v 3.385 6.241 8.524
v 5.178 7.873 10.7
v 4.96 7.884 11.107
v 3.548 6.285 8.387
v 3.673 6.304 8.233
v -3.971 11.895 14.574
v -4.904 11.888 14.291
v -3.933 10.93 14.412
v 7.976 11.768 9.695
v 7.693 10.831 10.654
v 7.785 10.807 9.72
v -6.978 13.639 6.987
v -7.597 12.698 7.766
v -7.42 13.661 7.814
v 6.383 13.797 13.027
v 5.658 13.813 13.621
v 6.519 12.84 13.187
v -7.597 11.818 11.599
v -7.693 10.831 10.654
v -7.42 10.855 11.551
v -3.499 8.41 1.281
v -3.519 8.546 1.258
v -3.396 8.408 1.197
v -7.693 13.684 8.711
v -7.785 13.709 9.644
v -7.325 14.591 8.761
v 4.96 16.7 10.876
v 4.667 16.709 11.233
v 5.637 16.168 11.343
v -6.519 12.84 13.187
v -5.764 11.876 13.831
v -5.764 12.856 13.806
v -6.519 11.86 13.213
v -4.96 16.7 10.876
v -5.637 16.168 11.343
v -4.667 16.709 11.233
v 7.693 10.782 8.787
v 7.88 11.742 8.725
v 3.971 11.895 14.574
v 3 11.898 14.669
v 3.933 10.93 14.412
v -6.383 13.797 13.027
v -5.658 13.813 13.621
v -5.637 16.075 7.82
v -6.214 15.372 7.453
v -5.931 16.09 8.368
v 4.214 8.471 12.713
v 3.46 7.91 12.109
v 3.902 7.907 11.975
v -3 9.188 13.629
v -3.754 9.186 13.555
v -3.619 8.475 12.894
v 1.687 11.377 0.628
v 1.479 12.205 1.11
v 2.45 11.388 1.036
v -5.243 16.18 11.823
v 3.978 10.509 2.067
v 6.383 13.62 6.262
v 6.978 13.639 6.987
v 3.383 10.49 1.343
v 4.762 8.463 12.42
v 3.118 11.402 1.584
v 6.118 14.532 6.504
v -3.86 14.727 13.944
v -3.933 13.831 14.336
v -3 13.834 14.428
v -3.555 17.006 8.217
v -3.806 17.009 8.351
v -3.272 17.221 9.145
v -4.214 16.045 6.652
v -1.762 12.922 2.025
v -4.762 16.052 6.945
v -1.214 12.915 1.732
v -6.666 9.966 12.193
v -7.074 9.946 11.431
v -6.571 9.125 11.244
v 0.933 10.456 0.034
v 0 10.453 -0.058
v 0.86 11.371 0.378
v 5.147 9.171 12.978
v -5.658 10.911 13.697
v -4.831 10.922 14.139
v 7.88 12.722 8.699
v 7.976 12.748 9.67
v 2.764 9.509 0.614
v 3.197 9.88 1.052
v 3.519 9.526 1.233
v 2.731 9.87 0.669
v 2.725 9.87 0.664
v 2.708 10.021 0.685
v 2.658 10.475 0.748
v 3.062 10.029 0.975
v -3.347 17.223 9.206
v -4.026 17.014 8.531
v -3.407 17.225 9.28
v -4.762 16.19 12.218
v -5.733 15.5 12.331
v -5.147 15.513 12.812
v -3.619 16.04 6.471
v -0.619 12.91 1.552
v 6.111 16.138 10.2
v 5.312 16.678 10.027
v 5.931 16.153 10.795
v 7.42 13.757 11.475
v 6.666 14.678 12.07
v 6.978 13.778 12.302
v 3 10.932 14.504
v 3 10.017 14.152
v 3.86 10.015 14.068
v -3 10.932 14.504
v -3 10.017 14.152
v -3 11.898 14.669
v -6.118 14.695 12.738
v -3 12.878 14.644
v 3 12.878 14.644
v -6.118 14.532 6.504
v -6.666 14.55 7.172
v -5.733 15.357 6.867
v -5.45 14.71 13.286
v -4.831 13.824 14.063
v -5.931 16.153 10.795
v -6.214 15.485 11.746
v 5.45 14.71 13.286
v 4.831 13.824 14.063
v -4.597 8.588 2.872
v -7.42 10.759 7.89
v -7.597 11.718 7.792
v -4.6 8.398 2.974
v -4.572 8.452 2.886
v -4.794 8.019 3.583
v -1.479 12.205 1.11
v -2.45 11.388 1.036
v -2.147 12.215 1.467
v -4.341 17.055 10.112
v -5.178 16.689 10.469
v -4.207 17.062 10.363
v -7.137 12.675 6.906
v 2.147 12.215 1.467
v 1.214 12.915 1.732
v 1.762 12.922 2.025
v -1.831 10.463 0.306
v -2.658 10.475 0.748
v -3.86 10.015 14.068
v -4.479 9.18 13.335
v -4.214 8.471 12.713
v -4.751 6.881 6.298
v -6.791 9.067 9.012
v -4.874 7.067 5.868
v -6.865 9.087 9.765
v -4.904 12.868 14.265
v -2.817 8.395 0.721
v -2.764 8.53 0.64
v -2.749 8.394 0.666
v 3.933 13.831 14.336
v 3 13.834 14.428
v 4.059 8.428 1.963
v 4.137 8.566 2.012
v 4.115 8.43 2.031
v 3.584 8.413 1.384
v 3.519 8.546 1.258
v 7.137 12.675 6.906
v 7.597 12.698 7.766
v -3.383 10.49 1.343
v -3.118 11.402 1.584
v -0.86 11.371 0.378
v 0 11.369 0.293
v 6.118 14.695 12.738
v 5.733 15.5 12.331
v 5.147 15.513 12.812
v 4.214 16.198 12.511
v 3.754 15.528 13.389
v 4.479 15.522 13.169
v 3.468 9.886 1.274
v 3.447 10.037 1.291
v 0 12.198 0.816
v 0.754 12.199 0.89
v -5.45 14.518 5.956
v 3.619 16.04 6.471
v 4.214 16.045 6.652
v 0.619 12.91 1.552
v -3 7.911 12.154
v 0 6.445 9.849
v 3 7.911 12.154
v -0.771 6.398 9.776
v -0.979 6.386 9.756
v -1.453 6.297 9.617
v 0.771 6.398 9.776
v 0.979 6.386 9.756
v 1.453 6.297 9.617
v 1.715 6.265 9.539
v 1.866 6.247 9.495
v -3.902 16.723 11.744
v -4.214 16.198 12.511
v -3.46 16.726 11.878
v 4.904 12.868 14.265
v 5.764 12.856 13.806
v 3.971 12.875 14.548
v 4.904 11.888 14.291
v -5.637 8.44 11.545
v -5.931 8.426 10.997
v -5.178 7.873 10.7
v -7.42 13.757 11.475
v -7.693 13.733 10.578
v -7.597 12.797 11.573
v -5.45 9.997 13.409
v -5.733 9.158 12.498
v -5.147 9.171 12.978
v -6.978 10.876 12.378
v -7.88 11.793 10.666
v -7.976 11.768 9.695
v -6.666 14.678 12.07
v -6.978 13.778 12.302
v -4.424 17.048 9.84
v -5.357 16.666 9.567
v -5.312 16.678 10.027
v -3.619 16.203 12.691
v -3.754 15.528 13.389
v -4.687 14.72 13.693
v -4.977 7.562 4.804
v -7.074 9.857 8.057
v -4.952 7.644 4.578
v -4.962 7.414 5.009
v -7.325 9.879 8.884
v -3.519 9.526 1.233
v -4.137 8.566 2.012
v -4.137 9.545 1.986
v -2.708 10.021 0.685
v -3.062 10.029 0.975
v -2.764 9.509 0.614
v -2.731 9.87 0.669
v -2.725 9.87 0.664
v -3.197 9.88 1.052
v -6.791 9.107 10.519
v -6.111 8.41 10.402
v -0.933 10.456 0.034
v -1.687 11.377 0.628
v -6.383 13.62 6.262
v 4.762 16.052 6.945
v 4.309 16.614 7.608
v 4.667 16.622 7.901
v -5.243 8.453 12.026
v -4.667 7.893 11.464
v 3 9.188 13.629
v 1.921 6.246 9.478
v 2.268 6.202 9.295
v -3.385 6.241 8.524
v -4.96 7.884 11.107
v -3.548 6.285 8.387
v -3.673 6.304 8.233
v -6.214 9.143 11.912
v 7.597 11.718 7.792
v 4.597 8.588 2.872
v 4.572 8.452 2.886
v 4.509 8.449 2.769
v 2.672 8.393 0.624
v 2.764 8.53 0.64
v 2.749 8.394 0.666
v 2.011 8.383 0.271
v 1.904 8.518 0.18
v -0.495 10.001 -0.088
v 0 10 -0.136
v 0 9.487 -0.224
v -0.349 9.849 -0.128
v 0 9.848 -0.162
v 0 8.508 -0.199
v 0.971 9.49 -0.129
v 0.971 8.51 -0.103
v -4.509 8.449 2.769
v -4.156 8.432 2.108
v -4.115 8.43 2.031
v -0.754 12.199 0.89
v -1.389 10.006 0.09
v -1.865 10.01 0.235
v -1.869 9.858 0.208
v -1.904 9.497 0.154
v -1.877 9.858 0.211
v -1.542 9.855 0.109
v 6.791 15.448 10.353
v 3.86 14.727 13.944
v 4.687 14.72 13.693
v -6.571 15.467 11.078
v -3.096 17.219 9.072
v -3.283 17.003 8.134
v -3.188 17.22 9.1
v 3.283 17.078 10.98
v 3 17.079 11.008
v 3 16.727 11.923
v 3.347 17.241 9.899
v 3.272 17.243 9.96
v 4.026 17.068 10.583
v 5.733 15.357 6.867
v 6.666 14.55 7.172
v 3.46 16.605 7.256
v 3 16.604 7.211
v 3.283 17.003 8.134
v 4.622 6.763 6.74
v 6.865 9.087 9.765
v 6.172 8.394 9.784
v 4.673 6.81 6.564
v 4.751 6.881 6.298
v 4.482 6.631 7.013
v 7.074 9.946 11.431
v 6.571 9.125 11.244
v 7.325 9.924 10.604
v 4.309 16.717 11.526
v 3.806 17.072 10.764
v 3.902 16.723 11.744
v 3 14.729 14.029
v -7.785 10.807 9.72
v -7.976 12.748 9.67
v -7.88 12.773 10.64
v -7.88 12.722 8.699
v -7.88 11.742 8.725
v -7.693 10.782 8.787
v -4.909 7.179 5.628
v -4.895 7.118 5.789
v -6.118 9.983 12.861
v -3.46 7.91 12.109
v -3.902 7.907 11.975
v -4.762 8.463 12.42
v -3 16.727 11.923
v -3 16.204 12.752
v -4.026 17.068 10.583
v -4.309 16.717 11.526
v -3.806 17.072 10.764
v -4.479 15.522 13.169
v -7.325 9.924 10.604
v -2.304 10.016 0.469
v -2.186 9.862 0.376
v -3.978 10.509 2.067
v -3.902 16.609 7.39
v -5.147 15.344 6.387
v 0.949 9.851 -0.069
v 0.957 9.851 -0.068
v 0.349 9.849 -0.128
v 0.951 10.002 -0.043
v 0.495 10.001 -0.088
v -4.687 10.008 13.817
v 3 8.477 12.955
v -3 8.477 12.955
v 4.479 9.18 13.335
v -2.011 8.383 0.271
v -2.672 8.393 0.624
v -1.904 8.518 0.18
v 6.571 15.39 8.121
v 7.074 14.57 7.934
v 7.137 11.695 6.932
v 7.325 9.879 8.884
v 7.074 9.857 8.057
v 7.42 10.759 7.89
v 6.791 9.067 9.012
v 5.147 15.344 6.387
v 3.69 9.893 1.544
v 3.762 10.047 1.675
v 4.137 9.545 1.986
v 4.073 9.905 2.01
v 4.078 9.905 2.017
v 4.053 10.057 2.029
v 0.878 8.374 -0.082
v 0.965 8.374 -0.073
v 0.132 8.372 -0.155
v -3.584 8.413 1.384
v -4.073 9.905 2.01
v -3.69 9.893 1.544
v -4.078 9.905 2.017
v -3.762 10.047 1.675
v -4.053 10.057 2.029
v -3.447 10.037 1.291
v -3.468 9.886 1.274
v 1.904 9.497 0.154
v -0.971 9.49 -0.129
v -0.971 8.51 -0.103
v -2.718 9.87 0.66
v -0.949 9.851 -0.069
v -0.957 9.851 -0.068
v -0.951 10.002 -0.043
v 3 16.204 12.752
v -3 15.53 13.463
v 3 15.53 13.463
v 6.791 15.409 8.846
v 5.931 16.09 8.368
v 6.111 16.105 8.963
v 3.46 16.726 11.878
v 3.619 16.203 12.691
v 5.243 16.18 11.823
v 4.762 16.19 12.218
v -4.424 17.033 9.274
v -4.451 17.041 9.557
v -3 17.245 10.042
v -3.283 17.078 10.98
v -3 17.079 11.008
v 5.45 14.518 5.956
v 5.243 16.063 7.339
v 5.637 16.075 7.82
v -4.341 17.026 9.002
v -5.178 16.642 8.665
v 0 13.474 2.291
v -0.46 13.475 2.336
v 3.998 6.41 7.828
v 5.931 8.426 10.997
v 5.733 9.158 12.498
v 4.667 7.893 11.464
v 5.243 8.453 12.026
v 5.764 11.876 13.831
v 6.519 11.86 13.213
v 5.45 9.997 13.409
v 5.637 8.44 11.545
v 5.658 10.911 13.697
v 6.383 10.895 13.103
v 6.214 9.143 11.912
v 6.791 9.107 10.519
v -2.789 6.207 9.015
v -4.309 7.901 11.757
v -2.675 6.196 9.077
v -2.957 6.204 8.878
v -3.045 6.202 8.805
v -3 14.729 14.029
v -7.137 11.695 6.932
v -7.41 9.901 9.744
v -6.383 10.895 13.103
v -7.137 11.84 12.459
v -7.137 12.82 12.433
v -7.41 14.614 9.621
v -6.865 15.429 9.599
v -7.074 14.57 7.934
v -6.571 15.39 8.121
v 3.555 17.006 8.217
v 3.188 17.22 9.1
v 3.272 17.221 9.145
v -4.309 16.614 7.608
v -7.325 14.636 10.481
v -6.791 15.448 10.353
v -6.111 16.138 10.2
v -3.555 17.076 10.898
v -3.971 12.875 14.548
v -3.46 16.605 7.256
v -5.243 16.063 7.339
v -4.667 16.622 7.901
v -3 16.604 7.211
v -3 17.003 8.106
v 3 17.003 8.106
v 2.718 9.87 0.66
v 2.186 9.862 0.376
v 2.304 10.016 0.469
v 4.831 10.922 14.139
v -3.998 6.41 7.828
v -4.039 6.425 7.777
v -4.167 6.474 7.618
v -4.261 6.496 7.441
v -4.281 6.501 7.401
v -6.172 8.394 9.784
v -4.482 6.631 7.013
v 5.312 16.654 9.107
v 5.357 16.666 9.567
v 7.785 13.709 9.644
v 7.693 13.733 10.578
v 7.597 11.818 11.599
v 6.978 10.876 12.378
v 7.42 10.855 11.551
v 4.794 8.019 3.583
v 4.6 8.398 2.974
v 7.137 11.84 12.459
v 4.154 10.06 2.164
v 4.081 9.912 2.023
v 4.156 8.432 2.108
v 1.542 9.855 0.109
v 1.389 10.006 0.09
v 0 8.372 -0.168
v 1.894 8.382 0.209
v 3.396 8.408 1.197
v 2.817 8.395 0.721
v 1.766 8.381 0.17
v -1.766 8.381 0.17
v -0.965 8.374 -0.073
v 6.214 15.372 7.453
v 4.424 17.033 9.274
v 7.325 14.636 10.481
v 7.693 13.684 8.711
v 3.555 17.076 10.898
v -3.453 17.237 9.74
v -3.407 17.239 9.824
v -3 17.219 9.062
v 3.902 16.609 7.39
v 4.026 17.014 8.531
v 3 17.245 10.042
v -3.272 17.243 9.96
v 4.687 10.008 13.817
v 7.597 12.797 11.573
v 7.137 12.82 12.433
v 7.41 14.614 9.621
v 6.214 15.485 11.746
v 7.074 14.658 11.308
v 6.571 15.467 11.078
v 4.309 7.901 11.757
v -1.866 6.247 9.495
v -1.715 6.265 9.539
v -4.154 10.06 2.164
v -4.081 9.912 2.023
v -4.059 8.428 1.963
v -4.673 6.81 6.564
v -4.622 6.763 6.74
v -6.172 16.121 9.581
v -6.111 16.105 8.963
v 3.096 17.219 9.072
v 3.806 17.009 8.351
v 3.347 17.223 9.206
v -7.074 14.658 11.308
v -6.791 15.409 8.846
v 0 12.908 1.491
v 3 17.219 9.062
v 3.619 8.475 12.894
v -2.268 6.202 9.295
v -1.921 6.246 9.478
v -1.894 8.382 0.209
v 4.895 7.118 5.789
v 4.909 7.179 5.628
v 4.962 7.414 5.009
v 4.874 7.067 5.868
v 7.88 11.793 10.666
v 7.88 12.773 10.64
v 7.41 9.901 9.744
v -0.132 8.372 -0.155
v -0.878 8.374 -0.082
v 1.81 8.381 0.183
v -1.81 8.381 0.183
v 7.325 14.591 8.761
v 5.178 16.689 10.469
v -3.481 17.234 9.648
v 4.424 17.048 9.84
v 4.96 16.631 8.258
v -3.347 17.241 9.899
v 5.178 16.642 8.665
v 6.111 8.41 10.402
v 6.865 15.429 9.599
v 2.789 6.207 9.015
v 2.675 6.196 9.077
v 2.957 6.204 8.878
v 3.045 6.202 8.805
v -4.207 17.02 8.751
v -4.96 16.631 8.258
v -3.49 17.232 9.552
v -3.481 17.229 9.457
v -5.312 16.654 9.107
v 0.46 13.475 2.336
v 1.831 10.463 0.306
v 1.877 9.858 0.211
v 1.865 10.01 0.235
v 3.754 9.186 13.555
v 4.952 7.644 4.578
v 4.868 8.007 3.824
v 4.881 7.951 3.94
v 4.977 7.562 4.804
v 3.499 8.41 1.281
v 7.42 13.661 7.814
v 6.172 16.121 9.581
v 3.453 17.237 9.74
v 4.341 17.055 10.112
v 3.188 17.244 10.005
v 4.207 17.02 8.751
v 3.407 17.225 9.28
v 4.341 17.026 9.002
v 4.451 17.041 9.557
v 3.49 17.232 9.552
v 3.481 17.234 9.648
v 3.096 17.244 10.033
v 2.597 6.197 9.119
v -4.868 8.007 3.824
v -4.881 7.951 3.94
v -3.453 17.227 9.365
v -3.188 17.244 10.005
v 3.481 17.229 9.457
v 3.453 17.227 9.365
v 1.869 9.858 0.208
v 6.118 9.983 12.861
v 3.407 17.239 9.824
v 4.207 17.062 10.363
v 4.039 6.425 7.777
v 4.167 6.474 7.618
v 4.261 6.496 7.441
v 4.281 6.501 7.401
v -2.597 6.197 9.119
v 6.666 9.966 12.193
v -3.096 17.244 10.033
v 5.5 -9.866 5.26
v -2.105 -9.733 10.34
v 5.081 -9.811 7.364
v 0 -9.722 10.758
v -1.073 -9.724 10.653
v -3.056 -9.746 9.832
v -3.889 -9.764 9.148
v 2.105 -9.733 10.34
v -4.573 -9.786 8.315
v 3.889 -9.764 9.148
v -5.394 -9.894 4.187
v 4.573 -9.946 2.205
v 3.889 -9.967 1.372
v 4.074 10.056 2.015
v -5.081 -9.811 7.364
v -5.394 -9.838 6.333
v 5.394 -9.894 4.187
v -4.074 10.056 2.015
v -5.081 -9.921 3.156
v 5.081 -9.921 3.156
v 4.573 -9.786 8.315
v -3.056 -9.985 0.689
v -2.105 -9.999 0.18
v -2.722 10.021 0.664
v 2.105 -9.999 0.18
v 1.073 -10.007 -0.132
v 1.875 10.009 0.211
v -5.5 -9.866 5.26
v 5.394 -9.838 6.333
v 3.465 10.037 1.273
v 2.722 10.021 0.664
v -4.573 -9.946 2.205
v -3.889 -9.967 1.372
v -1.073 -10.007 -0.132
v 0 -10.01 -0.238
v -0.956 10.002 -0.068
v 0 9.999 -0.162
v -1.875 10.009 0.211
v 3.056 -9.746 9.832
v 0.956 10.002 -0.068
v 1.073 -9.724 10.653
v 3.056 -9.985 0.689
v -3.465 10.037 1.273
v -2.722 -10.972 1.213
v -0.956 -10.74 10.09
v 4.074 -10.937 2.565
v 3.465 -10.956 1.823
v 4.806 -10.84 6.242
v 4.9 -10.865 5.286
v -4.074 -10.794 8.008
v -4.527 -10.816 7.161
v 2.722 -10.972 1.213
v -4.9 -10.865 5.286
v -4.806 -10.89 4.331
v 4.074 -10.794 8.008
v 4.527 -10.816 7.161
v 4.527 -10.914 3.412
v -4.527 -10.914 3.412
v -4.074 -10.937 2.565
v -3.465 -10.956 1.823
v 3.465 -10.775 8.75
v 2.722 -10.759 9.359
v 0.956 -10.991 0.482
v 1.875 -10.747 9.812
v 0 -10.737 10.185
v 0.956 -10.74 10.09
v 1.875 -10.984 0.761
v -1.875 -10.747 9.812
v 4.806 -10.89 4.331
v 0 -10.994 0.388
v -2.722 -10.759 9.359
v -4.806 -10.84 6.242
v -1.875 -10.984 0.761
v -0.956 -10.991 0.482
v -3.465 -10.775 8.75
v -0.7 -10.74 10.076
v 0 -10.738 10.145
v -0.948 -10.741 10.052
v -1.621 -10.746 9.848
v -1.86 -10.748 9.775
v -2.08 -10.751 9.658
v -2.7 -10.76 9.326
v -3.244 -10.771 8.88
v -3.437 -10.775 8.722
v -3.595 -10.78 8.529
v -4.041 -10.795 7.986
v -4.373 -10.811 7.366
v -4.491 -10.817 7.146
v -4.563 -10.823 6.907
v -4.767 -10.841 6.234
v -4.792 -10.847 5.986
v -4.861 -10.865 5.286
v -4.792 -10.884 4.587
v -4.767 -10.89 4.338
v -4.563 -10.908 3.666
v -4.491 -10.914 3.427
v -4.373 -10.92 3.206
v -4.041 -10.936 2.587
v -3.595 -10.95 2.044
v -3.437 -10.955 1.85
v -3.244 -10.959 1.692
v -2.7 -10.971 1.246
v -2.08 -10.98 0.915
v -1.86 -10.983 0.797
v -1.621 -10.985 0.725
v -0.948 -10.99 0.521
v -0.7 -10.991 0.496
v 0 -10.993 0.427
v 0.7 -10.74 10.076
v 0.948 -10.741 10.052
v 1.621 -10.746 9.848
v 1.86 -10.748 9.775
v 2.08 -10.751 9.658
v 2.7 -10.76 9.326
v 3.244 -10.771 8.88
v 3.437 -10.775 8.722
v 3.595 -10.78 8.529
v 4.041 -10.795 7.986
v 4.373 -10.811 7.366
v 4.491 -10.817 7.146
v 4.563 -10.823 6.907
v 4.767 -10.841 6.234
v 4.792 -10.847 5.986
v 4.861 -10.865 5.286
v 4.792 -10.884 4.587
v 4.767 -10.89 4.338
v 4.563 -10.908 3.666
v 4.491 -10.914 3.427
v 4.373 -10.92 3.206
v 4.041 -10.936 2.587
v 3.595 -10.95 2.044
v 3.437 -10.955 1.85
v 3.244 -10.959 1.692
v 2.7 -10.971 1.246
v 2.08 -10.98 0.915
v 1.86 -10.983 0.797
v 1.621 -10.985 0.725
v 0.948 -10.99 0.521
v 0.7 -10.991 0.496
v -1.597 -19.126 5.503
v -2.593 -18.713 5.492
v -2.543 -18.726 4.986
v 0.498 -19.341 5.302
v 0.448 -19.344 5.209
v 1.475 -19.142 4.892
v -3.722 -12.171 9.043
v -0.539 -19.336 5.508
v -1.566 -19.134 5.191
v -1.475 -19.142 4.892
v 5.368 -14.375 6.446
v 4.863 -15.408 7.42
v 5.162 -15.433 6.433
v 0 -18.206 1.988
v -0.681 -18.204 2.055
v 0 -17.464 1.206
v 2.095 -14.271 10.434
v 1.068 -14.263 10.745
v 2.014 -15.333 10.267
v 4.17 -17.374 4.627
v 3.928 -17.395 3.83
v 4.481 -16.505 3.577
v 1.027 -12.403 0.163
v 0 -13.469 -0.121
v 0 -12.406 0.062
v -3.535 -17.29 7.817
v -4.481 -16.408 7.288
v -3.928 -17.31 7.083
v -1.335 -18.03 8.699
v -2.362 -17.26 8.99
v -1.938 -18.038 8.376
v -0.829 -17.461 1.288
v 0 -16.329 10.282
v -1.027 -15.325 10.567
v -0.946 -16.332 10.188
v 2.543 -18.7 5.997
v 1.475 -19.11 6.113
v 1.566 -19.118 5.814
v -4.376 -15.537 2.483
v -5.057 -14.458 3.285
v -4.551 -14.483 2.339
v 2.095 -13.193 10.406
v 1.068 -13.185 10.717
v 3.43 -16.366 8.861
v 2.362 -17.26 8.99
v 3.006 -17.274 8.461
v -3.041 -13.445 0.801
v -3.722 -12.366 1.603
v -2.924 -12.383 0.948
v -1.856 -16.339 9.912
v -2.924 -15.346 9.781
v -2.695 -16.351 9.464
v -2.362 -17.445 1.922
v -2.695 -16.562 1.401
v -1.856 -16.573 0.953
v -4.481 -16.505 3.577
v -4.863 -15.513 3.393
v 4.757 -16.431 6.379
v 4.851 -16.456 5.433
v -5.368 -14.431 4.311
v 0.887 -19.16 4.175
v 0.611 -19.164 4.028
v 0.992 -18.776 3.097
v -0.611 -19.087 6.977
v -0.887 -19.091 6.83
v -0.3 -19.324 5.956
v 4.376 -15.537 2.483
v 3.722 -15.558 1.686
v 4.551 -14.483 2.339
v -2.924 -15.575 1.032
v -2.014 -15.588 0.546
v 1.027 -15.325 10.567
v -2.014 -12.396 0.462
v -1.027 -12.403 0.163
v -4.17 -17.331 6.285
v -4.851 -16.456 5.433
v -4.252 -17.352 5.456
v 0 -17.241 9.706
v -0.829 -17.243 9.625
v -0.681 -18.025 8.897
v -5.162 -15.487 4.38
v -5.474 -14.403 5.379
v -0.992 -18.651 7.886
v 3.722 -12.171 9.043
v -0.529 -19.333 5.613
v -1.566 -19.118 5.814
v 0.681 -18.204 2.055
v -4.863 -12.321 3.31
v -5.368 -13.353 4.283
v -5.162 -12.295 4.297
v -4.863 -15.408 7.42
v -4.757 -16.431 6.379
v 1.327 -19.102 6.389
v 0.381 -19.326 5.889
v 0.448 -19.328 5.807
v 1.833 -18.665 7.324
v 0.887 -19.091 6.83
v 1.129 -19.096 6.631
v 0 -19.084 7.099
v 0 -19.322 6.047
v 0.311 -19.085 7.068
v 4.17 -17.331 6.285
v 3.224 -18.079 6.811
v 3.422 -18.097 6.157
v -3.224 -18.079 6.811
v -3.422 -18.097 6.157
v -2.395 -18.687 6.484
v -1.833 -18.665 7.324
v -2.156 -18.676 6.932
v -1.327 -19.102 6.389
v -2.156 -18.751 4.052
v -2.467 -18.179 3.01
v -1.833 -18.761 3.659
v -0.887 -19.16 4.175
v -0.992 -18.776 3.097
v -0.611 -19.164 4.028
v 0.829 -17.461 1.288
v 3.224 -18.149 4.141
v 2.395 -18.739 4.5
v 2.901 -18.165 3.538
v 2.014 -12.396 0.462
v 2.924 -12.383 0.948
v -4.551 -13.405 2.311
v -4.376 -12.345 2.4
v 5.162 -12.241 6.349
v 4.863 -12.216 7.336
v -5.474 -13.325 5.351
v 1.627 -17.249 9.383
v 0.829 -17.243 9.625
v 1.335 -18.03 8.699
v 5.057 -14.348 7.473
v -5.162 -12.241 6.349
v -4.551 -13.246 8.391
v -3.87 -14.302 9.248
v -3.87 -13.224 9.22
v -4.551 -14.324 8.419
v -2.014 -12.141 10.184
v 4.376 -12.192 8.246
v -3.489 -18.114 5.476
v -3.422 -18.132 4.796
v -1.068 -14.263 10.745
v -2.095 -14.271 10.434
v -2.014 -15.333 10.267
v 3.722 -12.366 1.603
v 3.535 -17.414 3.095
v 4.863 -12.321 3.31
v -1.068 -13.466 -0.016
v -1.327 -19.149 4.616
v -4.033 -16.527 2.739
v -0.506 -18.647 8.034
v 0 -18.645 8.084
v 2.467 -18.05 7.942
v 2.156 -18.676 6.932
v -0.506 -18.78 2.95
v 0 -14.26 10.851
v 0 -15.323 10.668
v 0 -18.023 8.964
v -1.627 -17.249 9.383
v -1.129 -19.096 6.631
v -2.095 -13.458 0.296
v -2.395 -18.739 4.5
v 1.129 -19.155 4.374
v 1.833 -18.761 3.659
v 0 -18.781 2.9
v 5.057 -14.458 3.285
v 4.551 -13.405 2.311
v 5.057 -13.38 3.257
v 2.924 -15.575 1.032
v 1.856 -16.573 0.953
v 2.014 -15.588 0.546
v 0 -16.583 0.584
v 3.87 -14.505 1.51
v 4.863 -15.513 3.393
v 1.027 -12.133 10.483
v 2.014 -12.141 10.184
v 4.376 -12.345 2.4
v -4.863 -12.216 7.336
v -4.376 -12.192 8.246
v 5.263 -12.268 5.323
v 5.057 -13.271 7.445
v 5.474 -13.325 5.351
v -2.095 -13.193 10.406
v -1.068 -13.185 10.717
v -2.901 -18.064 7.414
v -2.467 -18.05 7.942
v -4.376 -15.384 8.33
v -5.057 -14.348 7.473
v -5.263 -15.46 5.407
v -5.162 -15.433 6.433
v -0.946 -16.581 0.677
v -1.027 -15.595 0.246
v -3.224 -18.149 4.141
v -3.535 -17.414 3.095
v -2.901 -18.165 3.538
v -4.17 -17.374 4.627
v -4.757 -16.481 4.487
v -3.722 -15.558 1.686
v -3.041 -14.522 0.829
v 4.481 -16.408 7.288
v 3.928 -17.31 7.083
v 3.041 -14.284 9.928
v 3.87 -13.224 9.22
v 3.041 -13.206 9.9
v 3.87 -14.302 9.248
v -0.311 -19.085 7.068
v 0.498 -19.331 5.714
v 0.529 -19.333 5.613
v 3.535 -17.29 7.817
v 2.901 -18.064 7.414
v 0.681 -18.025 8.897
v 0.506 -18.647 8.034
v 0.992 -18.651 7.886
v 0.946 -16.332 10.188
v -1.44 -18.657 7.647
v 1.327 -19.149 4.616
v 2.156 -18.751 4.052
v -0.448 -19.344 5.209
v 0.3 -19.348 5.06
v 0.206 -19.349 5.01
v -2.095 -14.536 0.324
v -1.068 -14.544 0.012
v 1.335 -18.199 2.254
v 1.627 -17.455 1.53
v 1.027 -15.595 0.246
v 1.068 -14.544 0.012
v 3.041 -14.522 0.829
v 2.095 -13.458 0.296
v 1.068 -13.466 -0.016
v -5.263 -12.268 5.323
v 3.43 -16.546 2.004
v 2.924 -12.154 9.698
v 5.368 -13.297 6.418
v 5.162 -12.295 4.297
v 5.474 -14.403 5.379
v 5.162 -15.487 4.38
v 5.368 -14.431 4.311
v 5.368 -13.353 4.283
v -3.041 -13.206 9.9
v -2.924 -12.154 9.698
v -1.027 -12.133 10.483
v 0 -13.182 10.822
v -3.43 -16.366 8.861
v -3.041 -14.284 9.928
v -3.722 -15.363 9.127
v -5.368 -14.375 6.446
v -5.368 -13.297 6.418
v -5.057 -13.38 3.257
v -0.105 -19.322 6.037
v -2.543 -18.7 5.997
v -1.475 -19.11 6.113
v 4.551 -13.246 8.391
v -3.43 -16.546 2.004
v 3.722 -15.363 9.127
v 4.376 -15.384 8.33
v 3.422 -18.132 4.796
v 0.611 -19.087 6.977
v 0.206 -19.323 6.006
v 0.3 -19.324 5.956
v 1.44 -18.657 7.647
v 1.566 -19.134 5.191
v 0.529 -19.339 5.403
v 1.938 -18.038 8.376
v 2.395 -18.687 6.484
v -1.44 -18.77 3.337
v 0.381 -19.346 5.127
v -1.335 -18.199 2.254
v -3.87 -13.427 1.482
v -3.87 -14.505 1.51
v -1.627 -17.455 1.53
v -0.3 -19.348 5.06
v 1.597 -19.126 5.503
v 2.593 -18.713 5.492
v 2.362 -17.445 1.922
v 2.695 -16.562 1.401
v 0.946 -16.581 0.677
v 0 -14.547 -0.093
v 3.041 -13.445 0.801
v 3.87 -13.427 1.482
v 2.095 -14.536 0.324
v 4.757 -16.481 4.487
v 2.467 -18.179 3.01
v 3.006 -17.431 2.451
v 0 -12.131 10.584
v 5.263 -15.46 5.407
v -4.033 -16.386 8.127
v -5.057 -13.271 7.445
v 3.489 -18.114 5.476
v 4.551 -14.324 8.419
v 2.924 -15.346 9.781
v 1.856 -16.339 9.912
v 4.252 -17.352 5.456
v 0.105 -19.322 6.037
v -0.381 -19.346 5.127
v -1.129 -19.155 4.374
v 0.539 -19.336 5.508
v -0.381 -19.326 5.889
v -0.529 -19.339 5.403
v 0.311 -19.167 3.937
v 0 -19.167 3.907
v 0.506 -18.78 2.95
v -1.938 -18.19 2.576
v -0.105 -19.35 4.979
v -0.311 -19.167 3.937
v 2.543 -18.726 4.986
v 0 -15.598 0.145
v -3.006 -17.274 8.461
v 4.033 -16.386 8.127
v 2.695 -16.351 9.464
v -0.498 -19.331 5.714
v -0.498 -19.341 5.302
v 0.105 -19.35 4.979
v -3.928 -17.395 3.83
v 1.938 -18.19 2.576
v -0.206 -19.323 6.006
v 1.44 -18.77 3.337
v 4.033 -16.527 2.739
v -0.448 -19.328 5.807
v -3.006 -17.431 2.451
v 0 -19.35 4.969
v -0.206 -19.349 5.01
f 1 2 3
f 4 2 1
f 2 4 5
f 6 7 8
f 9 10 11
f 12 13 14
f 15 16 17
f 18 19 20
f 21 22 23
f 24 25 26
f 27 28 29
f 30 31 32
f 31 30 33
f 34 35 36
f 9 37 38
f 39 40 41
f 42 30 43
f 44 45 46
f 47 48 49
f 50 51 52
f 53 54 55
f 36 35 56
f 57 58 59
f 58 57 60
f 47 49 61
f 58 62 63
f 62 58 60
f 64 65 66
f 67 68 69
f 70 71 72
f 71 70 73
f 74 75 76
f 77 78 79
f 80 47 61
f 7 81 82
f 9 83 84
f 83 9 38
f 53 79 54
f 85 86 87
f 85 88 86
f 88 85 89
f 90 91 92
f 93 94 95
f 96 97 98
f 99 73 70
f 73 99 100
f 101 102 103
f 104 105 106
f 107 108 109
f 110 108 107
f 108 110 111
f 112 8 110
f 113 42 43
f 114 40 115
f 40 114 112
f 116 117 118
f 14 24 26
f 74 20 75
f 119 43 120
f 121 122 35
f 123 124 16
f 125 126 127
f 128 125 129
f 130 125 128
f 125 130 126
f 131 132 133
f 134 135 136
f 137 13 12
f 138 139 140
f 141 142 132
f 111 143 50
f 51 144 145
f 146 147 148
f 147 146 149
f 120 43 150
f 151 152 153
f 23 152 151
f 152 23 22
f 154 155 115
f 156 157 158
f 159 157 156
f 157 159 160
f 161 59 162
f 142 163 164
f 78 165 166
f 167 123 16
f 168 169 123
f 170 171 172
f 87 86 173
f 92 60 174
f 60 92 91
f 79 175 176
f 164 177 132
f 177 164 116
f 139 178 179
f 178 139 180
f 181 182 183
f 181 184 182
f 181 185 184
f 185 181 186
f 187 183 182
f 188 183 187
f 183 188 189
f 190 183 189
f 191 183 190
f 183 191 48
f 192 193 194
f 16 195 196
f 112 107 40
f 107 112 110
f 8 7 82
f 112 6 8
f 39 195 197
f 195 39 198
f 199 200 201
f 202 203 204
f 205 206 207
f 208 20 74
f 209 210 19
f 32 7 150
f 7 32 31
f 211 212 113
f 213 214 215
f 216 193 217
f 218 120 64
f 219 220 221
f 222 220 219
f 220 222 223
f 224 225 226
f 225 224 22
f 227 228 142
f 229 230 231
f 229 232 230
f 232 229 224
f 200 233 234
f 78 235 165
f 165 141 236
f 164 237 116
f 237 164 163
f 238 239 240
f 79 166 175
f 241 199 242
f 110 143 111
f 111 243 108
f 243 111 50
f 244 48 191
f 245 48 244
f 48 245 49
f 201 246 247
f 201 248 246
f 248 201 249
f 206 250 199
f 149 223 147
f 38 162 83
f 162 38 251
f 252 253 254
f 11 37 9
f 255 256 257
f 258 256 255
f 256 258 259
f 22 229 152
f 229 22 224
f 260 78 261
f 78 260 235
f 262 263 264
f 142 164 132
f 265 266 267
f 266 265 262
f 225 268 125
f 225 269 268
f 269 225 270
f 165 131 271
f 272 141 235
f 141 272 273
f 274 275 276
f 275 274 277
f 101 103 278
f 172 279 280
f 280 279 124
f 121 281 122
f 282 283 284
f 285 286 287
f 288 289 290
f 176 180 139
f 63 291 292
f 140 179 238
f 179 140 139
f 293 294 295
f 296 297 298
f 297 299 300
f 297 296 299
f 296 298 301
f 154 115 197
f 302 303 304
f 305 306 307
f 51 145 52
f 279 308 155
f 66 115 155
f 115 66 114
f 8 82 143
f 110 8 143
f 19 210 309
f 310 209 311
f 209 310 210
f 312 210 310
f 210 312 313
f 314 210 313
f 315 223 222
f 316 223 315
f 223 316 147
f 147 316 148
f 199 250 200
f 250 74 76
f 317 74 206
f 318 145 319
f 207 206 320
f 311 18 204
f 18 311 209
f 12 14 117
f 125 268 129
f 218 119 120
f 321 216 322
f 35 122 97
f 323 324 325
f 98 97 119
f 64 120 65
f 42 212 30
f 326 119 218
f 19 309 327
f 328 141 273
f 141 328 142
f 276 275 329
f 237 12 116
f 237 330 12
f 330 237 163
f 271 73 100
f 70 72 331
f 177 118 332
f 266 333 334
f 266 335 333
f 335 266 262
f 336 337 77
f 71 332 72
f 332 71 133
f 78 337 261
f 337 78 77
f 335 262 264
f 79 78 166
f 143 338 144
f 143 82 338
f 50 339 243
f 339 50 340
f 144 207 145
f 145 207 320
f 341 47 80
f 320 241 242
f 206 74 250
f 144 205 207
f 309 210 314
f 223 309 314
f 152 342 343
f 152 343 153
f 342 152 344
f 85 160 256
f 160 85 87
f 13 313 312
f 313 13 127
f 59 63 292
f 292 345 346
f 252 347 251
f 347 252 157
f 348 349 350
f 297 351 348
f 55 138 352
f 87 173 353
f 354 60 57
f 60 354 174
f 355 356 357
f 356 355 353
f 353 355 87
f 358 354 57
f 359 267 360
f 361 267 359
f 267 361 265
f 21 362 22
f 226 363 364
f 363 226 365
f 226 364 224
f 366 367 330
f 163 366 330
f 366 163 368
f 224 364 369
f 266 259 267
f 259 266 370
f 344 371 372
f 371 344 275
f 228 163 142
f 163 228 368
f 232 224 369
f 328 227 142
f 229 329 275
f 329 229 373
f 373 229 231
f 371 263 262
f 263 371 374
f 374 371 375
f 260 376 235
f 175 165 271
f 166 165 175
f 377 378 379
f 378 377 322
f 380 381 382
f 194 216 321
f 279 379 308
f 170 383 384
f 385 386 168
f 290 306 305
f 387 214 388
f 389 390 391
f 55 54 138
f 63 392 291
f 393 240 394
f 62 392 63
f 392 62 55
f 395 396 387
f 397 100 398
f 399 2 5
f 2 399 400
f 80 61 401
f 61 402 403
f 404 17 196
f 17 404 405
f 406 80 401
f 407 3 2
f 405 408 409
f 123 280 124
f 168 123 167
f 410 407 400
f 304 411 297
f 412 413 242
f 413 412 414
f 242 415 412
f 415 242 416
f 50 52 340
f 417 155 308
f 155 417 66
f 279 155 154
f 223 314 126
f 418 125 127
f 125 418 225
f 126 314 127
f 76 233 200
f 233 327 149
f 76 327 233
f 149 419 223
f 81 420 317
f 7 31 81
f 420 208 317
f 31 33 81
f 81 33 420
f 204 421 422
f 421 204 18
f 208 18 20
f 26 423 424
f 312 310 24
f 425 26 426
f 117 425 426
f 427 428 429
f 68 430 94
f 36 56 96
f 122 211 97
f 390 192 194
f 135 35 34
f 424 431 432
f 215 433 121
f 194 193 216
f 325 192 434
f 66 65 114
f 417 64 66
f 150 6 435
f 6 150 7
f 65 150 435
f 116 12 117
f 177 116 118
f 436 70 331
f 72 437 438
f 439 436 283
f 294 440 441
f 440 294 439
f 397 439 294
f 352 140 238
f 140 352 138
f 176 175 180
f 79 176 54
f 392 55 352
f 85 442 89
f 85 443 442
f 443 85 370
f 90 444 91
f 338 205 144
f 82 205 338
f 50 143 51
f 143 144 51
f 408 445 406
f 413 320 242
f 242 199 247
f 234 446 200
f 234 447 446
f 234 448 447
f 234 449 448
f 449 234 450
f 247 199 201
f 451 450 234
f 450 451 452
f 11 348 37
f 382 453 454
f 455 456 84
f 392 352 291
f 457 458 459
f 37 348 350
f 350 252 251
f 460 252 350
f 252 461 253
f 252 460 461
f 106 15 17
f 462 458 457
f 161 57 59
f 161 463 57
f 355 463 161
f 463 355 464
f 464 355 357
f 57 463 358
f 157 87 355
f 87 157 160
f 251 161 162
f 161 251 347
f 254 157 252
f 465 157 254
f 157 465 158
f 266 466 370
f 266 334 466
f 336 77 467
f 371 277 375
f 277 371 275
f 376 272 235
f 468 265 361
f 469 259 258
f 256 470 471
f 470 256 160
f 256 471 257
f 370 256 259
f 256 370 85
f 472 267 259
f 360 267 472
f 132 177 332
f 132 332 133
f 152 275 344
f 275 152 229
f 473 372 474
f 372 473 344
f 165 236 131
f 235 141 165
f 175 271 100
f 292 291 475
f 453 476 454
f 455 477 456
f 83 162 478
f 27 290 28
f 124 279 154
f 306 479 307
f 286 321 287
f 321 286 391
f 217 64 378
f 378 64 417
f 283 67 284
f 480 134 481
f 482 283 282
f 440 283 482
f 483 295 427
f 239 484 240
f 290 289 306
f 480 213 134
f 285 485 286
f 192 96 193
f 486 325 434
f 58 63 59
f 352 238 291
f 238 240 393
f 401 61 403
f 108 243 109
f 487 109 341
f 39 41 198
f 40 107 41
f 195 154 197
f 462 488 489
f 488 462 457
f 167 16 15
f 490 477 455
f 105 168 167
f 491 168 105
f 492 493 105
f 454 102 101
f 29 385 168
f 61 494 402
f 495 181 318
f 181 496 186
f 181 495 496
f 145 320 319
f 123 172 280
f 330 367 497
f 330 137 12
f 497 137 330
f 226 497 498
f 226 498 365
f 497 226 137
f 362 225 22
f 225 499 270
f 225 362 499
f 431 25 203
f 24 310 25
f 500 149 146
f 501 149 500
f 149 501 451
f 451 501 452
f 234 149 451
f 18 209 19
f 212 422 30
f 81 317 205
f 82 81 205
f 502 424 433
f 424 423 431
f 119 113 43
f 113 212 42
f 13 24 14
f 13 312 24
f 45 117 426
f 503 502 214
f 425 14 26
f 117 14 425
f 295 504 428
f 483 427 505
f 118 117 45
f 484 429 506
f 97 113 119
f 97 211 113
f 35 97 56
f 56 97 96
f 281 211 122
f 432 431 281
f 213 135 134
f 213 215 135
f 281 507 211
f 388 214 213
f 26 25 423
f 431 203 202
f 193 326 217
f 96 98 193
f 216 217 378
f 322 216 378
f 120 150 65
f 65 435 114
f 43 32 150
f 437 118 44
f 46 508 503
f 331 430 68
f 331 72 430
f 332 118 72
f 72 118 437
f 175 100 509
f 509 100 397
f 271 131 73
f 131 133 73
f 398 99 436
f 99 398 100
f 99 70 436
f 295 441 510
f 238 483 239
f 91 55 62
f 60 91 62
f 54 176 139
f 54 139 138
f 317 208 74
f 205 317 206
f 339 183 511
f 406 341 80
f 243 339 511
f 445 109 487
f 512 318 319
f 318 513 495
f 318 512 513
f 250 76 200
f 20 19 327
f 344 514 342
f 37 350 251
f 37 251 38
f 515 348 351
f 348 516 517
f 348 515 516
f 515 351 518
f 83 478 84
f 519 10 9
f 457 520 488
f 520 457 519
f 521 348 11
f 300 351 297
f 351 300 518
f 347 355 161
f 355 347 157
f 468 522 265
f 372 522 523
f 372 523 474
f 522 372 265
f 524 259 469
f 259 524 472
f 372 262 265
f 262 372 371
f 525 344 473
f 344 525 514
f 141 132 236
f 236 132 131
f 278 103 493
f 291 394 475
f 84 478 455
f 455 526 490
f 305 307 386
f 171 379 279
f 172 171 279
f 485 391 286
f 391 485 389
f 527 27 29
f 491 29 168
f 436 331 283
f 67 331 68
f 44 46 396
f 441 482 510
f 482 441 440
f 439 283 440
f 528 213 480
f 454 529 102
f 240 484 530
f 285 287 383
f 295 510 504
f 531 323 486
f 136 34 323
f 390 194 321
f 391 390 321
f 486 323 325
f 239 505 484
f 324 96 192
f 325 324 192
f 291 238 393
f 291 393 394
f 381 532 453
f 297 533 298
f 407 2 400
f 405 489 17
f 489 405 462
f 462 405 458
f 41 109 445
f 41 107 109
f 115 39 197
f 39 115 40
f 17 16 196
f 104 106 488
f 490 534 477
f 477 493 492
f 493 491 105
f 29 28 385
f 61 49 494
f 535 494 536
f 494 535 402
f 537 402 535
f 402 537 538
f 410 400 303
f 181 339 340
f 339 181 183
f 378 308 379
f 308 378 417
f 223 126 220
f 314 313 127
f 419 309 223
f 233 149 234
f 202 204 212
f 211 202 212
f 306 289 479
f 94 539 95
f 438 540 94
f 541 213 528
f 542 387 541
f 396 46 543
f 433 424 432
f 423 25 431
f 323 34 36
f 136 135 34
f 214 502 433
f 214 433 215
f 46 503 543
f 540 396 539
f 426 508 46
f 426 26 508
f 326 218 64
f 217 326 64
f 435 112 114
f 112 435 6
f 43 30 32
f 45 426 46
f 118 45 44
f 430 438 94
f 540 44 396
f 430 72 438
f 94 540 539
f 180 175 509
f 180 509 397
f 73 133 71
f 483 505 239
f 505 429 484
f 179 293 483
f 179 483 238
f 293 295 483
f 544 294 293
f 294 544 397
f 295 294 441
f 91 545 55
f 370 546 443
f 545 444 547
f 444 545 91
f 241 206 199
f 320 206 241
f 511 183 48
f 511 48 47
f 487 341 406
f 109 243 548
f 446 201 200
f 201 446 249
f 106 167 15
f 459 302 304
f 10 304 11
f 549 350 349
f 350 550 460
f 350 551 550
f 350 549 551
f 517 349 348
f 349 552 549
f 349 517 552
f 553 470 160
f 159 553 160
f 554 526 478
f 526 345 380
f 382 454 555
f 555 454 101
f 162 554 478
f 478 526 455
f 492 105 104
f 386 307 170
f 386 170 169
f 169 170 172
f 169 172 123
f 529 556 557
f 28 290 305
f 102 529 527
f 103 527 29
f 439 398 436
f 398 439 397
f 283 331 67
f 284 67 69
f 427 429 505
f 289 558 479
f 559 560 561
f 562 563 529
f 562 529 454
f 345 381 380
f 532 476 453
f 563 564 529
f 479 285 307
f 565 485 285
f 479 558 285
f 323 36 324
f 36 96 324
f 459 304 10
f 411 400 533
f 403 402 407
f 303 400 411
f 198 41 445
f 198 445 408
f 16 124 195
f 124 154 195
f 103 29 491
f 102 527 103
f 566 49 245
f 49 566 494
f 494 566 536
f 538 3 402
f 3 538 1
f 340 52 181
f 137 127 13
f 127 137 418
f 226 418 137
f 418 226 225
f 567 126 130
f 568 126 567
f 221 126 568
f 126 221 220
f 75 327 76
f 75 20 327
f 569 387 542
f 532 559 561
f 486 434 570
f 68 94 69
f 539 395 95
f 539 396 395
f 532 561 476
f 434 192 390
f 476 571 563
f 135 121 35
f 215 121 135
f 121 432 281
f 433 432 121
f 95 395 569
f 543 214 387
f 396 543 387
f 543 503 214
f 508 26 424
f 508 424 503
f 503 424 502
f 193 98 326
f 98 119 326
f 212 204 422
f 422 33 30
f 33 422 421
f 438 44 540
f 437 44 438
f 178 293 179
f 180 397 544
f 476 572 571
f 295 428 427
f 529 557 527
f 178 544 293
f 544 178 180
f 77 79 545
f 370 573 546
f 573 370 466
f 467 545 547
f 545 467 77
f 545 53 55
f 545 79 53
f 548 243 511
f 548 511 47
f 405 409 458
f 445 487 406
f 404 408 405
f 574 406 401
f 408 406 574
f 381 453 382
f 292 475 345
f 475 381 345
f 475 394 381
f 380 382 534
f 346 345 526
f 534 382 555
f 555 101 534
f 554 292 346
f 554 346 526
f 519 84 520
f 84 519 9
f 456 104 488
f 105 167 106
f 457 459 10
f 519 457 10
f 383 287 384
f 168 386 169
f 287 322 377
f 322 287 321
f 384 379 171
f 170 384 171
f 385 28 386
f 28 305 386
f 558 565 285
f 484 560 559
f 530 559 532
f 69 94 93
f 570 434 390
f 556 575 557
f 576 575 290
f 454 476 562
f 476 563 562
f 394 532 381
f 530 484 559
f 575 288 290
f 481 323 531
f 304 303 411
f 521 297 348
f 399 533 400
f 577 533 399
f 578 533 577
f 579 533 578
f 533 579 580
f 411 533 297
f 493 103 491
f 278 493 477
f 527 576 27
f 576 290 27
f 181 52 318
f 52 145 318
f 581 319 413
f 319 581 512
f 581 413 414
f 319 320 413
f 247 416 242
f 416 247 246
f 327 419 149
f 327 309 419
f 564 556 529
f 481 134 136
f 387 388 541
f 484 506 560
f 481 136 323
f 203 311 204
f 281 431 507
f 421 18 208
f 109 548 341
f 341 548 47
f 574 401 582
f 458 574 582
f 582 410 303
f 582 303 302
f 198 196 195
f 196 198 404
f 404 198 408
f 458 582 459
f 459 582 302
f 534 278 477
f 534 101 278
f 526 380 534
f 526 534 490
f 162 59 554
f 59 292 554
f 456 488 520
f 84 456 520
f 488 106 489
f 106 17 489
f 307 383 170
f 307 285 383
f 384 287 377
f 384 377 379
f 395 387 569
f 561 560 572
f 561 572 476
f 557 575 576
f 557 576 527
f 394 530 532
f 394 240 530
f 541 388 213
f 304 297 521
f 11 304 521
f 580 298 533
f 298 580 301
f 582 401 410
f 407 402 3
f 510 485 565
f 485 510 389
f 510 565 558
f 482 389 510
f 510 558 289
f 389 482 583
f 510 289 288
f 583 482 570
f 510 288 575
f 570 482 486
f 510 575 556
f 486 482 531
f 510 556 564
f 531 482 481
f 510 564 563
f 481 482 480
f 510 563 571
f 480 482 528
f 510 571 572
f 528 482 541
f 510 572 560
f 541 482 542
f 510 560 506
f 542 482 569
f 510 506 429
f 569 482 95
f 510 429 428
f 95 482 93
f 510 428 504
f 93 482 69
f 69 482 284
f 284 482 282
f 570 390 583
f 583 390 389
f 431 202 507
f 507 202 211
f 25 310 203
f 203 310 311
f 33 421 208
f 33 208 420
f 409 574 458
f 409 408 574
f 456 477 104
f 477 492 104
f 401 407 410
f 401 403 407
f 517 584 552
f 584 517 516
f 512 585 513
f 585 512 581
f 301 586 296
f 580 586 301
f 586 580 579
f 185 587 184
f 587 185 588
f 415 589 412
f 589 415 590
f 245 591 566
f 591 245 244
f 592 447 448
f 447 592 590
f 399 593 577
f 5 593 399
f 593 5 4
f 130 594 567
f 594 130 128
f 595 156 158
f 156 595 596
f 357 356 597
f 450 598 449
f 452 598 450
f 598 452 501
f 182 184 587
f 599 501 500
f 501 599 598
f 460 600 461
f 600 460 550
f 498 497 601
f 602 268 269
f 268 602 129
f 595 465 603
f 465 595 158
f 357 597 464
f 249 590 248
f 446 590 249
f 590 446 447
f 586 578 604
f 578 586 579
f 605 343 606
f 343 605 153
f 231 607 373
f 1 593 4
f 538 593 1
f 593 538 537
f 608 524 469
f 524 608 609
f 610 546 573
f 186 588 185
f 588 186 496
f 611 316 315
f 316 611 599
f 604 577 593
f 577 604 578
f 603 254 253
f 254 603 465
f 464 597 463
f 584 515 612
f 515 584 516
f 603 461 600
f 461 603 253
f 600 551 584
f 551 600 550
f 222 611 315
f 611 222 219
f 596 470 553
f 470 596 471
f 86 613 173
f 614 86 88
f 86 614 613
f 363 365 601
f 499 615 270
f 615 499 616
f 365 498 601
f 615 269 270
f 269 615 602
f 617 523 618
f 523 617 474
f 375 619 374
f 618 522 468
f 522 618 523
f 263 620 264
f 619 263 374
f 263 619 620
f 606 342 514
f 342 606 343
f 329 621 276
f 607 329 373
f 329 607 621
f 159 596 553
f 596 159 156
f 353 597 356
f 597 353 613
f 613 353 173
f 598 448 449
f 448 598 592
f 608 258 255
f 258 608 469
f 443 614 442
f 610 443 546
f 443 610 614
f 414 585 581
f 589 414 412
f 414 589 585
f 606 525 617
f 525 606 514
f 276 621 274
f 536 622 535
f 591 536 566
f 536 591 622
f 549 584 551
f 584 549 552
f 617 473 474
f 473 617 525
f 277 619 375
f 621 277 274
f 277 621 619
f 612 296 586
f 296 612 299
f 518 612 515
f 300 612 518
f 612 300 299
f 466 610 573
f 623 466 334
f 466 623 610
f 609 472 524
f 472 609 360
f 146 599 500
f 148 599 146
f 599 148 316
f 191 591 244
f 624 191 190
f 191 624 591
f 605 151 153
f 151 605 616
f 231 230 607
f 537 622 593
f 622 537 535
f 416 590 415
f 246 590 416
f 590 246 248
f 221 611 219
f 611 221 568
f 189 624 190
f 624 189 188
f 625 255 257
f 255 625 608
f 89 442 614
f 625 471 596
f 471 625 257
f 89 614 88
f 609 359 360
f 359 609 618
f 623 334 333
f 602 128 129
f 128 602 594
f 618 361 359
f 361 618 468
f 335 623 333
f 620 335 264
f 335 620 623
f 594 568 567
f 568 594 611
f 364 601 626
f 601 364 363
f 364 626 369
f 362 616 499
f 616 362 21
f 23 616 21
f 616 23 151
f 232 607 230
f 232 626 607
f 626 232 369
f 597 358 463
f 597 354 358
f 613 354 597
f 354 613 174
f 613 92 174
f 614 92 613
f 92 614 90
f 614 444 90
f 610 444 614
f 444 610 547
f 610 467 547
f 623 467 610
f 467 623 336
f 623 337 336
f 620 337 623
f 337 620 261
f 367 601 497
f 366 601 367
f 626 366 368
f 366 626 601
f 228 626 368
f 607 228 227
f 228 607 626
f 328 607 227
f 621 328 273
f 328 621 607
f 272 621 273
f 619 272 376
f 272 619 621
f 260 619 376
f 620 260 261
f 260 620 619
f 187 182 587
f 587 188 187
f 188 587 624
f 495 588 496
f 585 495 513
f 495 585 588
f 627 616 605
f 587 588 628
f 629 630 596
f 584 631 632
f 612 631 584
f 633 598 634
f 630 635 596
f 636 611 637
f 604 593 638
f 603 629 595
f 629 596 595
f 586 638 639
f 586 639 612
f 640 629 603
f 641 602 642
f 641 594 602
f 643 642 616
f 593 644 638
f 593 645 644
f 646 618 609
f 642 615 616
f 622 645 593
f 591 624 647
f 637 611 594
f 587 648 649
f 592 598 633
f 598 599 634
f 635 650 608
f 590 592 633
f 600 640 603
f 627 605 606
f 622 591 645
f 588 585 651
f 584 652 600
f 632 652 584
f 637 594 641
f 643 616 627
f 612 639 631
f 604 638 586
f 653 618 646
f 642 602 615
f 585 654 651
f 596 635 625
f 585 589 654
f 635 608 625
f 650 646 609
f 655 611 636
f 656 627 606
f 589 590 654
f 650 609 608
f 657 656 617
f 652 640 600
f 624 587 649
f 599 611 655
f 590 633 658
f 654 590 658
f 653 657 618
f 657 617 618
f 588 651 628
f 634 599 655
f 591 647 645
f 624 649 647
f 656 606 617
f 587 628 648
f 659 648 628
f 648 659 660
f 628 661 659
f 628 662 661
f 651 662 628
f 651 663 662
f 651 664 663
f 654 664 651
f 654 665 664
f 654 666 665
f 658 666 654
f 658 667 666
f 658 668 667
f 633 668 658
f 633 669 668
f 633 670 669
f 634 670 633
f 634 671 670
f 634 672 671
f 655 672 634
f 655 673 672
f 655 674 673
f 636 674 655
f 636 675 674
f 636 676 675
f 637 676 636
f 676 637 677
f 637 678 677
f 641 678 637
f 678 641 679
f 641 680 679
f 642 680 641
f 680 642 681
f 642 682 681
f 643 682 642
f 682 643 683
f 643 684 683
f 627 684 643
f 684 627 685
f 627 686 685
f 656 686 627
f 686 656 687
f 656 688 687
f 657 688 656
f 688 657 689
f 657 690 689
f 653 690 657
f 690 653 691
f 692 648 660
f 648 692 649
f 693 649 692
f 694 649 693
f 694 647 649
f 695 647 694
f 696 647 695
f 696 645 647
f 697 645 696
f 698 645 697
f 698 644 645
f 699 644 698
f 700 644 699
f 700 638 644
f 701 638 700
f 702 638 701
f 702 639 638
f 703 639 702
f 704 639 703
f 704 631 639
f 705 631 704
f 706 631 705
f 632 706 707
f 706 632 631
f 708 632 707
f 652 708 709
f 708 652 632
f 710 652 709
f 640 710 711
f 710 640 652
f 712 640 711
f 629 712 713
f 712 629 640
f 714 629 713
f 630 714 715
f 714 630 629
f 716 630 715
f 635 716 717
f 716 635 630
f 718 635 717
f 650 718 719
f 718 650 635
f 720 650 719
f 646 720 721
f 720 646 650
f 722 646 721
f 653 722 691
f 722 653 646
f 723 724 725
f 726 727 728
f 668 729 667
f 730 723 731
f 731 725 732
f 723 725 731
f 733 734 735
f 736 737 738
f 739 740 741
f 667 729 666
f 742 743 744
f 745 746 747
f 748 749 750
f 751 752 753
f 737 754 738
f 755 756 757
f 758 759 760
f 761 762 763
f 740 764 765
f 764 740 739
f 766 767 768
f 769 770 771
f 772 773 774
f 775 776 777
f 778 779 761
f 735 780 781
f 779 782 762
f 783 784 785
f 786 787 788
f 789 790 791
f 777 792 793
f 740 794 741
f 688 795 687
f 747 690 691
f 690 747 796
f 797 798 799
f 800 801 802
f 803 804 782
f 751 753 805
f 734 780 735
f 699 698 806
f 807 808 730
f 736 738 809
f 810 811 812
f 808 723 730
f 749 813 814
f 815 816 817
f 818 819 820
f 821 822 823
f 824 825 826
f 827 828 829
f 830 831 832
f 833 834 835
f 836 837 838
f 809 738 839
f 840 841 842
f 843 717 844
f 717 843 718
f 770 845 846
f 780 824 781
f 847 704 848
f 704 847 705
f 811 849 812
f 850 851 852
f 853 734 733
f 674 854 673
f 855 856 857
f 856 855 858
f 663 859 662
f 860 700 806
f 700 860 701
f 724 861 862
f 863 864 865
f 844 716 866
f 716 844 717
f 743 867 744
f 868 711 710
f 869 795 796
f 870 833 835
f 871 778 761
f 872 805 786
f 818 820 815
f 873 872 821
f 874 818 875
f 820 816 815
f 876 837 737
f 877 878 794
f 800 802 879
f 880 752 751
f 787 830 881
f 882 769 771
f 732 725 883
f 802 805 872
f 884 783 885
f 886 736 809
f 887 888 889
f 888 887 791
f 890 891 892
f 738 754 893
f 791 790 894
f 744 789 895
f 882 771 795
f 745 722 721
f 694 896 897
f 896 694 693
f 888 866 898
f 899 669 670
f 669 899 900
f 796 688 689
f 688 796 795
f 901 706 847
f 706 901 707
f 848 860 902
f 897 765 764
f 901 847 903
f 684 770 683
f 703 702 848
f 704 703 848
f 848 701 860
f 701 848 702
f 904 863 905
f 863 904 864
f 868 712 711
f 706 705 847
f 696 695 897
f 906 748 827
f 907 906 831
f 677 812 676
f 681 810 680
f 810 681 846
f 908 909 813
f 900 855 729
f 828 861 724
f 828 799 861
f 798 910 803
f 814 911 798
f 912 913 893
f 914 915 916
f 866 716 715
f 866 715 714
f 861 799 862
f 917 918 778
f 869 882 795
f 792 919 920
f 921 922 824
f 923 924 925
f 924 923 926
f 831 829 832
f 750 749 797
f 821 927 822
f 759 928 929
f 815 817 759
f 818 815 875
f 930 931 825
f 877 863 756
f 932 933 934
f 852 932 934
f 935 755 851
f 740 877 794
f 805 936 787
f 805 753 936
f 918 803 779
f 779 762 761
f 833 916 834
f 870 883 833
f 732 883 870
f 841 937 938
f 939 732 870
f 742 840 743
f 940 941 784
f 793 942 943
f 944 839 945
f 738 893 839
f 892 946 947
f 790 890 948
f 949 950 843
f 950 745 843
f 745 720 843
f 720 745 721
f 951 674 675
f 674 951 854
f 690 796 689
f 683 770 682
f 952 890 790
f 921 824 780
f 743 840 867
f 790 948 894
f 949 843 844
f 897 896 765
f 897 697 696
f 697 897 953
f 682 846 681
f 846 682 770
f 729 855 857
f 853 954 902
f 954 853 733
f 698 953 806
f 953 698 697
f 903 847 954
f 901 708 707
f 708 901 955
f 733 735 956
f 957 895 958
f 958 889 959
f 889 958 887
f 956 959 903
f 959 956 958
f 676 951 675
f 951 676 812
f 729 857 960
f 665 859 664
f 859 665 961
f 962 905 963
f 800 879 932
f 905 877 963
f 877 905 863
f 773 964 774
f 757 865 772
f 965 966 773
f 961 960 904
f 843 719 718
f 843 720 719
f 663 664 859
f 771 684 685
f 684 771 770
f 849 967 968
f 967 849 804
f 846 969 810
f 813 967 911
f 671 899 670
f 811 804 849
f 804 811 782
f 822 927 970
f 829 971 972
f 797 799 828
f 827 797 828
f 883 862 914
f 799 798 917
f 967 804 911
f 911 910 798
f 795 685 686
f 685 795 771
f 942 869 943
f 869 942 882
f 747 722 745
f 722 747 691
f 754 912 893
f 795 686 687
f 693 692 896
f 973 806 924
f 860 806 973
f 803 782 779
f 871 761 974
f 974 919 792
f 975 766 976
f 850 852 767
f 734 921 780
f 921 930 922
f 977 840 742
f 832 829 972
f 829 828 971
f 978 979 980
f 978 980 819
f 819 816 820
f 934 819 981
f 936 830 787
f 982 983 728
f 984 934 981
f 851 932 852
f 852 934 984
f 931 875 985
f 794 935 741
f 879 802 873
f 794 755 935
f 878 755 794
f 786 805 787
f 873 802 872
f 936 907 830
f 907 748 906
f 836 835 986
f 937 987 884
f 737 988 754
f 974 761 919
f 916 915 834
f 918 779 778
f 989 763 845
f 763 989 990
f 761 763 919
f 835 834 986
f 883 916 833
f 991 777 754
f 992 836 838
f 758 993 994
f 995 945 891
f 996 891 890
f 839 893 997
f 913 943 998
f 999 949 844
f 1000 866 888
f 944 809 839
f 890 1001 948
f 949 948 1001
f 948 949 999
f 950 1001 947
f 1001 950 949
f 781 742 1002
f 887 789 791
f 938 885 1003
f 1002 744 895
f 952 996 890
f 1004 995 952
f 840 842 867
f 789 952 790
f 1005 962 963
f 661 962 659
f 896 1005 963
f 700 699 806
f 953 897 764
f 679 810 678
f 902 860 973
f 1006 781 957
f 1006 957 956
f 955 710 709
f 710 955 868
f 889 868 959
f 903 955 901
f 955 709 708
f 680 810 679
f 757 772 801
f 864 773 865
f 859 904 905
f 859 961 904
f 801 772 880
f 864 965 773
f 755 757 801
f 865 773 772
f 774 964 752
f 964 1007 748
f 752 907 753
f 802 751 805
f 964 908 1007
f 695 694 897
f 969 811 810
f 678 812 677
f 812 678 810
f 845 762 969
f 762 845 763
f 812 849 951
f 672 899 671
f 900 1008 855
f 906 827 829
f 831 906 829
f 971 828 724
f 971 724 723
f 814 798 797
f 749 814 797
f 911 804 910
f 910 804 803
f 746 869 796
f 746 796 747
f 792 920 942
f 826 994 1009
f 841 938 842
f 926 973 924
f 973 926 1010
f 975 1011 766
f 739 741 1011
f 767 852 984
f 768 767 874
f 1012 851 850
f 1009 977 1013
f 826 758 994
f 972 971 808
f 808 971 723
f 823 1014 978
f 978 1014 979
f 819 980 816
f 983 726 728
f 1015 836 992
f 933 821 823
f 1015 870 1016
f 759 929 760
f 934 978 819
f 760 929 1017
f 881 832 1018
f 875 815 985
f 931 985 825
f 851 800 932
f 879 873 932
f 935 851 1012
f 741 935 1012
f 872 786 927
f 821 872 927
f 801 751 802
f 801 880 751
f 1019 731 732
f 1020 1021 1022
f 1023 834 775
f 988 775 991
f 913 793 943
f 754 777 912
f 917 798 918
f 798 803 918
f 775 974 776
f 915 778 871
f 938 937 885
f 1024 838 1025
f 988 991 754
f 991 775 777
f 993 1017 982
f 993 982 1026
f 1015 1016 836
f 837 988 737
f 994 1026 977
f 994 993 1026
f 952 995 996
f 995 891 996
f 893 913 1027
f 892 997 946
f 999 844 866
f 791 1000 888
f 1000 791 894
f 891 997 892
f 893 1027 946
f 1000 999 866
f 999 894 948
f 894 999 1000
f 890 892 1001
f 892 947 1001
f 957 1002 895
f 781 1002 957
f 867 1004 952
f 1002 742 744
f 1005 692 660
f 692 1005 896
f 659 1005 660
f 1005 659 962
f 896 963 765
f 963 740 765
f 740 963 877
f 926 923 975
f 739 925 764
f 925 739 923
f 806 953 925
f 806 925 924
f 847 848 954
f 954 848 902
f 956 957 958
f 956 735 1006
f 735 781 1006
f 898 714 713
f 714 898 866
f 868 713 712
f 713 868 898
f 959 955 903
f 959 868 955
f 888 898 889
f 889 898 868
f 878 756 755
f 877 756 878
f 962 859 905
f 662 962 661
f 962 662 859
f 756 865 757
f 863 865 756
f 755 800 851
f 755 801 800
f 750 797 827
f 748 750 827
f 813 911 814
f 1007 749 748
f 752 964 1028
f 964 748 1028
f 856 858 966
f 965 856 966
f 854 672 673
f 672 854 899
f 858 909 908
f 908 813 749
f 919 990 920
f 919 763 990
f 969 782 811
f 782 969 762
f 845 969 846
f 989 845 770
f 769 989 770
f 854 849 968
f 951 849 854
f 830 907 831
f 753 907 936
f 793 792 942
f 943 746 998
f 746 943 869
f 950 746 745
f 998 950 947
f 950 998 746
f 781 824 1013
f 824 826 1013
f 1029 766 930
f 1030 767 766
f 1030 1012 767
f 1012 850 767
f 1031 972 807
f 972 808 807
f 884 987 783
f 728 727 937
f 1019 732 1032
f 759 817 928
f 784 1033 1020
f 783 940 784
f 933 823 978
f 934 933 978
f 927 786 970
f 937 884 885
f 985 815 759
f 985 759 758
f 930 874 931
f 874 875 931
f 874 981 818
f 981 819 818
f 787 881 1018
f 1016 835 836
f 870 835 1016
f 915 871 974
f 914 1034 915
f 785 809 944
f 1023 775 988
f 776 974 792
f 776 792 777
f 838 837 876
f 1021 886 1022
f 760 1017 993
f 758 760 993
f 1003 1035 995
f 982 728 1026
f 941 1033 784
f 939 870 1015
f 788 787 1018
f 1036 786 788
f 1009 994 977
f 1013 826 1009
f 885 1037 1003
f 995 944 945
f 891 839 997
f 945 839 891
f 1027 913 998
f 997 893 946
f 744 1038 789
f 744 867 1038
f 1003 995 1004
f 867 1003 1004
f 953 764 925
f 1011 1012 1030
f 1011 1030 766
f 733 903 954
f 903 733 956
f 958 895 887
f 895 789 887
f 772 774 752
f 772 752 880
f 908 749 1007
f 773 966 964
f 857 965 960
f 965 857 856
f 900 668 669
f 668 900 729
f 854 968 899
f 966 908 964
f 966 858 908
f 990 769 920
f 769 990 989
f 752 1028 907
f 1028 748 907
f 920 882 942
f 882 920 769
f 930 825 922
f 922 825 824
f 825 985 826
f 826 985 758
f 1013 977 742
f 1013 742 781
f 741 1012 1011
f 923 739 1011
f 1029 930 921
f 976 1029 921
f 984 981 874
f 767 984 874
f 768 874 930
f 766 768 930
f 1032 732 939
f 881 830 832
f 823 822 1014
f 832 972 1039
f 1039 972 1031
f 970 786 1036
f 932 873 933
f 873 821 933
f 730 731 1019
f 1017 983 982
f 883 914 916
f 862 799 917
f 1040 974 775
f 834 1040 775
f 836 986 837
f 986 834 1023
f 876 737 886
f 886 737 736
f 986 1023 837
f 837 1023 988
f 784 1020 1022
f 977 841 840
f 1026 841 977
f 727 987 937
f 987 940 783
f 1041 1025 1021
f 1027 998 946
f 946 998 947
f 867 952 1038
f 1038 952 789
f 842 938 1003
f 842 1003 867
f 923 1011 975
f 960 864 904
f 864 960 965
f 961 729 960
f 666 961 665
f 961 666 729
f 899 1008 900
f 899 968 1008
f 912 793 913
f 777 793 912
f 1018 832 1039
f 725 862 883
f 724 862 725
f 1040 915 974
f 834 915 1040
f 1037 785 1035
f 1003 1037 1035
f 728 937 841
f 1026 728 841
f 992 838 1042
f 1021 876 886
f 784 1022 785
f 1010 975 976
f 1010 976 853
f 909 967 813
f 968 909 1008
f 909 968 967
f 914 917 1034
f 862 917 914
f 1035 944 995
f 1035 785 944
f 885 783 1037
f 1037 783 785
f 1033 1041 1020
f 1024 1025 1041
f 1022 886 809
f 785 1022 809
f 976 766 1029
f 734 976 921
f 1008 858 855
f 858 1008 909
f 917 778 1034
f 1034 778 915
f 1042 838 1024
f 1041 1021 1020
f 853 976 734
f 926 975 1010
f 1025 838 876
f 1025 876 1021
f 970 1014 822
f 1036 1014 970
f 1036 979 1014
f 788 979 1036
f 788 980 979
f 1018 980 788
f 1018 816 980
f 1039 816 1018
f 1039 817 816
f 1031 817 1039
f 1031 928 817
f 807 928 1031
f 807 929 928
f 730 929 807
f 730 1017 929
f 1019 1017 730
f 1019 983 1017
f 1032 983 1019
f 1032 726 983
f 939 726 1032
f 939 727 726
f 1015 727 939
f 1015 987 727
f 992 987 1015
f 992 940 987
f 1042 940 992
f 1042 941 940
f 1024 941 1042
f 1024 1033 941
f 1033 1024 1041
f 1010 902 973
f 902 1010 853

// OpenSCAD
//can't have a 3D printer without printing at least one of these !

$fn=32;
rotate([88.5,0,0])


translate([0,5,-12])
union(){
	hull(){
		translate([-3,5,0])
			union(){
				sphere(5);
				translate([6,0,0]) sphere(5);
			}

		translate([0,0,3]) sphere(5);
	}
	translate([0,0,2])
		cylinder(h=20,r1=4.9,r2=5.5);

	translate([0,0,22])
		cylinder(h=1,r2=4.9,r1=5.5);

	hull(){

	translate([0,0,20])
		cylinder(h=5,r1=4,r2=4);
	translate([0,0,26])
		sphere(5.5);
	}
}
